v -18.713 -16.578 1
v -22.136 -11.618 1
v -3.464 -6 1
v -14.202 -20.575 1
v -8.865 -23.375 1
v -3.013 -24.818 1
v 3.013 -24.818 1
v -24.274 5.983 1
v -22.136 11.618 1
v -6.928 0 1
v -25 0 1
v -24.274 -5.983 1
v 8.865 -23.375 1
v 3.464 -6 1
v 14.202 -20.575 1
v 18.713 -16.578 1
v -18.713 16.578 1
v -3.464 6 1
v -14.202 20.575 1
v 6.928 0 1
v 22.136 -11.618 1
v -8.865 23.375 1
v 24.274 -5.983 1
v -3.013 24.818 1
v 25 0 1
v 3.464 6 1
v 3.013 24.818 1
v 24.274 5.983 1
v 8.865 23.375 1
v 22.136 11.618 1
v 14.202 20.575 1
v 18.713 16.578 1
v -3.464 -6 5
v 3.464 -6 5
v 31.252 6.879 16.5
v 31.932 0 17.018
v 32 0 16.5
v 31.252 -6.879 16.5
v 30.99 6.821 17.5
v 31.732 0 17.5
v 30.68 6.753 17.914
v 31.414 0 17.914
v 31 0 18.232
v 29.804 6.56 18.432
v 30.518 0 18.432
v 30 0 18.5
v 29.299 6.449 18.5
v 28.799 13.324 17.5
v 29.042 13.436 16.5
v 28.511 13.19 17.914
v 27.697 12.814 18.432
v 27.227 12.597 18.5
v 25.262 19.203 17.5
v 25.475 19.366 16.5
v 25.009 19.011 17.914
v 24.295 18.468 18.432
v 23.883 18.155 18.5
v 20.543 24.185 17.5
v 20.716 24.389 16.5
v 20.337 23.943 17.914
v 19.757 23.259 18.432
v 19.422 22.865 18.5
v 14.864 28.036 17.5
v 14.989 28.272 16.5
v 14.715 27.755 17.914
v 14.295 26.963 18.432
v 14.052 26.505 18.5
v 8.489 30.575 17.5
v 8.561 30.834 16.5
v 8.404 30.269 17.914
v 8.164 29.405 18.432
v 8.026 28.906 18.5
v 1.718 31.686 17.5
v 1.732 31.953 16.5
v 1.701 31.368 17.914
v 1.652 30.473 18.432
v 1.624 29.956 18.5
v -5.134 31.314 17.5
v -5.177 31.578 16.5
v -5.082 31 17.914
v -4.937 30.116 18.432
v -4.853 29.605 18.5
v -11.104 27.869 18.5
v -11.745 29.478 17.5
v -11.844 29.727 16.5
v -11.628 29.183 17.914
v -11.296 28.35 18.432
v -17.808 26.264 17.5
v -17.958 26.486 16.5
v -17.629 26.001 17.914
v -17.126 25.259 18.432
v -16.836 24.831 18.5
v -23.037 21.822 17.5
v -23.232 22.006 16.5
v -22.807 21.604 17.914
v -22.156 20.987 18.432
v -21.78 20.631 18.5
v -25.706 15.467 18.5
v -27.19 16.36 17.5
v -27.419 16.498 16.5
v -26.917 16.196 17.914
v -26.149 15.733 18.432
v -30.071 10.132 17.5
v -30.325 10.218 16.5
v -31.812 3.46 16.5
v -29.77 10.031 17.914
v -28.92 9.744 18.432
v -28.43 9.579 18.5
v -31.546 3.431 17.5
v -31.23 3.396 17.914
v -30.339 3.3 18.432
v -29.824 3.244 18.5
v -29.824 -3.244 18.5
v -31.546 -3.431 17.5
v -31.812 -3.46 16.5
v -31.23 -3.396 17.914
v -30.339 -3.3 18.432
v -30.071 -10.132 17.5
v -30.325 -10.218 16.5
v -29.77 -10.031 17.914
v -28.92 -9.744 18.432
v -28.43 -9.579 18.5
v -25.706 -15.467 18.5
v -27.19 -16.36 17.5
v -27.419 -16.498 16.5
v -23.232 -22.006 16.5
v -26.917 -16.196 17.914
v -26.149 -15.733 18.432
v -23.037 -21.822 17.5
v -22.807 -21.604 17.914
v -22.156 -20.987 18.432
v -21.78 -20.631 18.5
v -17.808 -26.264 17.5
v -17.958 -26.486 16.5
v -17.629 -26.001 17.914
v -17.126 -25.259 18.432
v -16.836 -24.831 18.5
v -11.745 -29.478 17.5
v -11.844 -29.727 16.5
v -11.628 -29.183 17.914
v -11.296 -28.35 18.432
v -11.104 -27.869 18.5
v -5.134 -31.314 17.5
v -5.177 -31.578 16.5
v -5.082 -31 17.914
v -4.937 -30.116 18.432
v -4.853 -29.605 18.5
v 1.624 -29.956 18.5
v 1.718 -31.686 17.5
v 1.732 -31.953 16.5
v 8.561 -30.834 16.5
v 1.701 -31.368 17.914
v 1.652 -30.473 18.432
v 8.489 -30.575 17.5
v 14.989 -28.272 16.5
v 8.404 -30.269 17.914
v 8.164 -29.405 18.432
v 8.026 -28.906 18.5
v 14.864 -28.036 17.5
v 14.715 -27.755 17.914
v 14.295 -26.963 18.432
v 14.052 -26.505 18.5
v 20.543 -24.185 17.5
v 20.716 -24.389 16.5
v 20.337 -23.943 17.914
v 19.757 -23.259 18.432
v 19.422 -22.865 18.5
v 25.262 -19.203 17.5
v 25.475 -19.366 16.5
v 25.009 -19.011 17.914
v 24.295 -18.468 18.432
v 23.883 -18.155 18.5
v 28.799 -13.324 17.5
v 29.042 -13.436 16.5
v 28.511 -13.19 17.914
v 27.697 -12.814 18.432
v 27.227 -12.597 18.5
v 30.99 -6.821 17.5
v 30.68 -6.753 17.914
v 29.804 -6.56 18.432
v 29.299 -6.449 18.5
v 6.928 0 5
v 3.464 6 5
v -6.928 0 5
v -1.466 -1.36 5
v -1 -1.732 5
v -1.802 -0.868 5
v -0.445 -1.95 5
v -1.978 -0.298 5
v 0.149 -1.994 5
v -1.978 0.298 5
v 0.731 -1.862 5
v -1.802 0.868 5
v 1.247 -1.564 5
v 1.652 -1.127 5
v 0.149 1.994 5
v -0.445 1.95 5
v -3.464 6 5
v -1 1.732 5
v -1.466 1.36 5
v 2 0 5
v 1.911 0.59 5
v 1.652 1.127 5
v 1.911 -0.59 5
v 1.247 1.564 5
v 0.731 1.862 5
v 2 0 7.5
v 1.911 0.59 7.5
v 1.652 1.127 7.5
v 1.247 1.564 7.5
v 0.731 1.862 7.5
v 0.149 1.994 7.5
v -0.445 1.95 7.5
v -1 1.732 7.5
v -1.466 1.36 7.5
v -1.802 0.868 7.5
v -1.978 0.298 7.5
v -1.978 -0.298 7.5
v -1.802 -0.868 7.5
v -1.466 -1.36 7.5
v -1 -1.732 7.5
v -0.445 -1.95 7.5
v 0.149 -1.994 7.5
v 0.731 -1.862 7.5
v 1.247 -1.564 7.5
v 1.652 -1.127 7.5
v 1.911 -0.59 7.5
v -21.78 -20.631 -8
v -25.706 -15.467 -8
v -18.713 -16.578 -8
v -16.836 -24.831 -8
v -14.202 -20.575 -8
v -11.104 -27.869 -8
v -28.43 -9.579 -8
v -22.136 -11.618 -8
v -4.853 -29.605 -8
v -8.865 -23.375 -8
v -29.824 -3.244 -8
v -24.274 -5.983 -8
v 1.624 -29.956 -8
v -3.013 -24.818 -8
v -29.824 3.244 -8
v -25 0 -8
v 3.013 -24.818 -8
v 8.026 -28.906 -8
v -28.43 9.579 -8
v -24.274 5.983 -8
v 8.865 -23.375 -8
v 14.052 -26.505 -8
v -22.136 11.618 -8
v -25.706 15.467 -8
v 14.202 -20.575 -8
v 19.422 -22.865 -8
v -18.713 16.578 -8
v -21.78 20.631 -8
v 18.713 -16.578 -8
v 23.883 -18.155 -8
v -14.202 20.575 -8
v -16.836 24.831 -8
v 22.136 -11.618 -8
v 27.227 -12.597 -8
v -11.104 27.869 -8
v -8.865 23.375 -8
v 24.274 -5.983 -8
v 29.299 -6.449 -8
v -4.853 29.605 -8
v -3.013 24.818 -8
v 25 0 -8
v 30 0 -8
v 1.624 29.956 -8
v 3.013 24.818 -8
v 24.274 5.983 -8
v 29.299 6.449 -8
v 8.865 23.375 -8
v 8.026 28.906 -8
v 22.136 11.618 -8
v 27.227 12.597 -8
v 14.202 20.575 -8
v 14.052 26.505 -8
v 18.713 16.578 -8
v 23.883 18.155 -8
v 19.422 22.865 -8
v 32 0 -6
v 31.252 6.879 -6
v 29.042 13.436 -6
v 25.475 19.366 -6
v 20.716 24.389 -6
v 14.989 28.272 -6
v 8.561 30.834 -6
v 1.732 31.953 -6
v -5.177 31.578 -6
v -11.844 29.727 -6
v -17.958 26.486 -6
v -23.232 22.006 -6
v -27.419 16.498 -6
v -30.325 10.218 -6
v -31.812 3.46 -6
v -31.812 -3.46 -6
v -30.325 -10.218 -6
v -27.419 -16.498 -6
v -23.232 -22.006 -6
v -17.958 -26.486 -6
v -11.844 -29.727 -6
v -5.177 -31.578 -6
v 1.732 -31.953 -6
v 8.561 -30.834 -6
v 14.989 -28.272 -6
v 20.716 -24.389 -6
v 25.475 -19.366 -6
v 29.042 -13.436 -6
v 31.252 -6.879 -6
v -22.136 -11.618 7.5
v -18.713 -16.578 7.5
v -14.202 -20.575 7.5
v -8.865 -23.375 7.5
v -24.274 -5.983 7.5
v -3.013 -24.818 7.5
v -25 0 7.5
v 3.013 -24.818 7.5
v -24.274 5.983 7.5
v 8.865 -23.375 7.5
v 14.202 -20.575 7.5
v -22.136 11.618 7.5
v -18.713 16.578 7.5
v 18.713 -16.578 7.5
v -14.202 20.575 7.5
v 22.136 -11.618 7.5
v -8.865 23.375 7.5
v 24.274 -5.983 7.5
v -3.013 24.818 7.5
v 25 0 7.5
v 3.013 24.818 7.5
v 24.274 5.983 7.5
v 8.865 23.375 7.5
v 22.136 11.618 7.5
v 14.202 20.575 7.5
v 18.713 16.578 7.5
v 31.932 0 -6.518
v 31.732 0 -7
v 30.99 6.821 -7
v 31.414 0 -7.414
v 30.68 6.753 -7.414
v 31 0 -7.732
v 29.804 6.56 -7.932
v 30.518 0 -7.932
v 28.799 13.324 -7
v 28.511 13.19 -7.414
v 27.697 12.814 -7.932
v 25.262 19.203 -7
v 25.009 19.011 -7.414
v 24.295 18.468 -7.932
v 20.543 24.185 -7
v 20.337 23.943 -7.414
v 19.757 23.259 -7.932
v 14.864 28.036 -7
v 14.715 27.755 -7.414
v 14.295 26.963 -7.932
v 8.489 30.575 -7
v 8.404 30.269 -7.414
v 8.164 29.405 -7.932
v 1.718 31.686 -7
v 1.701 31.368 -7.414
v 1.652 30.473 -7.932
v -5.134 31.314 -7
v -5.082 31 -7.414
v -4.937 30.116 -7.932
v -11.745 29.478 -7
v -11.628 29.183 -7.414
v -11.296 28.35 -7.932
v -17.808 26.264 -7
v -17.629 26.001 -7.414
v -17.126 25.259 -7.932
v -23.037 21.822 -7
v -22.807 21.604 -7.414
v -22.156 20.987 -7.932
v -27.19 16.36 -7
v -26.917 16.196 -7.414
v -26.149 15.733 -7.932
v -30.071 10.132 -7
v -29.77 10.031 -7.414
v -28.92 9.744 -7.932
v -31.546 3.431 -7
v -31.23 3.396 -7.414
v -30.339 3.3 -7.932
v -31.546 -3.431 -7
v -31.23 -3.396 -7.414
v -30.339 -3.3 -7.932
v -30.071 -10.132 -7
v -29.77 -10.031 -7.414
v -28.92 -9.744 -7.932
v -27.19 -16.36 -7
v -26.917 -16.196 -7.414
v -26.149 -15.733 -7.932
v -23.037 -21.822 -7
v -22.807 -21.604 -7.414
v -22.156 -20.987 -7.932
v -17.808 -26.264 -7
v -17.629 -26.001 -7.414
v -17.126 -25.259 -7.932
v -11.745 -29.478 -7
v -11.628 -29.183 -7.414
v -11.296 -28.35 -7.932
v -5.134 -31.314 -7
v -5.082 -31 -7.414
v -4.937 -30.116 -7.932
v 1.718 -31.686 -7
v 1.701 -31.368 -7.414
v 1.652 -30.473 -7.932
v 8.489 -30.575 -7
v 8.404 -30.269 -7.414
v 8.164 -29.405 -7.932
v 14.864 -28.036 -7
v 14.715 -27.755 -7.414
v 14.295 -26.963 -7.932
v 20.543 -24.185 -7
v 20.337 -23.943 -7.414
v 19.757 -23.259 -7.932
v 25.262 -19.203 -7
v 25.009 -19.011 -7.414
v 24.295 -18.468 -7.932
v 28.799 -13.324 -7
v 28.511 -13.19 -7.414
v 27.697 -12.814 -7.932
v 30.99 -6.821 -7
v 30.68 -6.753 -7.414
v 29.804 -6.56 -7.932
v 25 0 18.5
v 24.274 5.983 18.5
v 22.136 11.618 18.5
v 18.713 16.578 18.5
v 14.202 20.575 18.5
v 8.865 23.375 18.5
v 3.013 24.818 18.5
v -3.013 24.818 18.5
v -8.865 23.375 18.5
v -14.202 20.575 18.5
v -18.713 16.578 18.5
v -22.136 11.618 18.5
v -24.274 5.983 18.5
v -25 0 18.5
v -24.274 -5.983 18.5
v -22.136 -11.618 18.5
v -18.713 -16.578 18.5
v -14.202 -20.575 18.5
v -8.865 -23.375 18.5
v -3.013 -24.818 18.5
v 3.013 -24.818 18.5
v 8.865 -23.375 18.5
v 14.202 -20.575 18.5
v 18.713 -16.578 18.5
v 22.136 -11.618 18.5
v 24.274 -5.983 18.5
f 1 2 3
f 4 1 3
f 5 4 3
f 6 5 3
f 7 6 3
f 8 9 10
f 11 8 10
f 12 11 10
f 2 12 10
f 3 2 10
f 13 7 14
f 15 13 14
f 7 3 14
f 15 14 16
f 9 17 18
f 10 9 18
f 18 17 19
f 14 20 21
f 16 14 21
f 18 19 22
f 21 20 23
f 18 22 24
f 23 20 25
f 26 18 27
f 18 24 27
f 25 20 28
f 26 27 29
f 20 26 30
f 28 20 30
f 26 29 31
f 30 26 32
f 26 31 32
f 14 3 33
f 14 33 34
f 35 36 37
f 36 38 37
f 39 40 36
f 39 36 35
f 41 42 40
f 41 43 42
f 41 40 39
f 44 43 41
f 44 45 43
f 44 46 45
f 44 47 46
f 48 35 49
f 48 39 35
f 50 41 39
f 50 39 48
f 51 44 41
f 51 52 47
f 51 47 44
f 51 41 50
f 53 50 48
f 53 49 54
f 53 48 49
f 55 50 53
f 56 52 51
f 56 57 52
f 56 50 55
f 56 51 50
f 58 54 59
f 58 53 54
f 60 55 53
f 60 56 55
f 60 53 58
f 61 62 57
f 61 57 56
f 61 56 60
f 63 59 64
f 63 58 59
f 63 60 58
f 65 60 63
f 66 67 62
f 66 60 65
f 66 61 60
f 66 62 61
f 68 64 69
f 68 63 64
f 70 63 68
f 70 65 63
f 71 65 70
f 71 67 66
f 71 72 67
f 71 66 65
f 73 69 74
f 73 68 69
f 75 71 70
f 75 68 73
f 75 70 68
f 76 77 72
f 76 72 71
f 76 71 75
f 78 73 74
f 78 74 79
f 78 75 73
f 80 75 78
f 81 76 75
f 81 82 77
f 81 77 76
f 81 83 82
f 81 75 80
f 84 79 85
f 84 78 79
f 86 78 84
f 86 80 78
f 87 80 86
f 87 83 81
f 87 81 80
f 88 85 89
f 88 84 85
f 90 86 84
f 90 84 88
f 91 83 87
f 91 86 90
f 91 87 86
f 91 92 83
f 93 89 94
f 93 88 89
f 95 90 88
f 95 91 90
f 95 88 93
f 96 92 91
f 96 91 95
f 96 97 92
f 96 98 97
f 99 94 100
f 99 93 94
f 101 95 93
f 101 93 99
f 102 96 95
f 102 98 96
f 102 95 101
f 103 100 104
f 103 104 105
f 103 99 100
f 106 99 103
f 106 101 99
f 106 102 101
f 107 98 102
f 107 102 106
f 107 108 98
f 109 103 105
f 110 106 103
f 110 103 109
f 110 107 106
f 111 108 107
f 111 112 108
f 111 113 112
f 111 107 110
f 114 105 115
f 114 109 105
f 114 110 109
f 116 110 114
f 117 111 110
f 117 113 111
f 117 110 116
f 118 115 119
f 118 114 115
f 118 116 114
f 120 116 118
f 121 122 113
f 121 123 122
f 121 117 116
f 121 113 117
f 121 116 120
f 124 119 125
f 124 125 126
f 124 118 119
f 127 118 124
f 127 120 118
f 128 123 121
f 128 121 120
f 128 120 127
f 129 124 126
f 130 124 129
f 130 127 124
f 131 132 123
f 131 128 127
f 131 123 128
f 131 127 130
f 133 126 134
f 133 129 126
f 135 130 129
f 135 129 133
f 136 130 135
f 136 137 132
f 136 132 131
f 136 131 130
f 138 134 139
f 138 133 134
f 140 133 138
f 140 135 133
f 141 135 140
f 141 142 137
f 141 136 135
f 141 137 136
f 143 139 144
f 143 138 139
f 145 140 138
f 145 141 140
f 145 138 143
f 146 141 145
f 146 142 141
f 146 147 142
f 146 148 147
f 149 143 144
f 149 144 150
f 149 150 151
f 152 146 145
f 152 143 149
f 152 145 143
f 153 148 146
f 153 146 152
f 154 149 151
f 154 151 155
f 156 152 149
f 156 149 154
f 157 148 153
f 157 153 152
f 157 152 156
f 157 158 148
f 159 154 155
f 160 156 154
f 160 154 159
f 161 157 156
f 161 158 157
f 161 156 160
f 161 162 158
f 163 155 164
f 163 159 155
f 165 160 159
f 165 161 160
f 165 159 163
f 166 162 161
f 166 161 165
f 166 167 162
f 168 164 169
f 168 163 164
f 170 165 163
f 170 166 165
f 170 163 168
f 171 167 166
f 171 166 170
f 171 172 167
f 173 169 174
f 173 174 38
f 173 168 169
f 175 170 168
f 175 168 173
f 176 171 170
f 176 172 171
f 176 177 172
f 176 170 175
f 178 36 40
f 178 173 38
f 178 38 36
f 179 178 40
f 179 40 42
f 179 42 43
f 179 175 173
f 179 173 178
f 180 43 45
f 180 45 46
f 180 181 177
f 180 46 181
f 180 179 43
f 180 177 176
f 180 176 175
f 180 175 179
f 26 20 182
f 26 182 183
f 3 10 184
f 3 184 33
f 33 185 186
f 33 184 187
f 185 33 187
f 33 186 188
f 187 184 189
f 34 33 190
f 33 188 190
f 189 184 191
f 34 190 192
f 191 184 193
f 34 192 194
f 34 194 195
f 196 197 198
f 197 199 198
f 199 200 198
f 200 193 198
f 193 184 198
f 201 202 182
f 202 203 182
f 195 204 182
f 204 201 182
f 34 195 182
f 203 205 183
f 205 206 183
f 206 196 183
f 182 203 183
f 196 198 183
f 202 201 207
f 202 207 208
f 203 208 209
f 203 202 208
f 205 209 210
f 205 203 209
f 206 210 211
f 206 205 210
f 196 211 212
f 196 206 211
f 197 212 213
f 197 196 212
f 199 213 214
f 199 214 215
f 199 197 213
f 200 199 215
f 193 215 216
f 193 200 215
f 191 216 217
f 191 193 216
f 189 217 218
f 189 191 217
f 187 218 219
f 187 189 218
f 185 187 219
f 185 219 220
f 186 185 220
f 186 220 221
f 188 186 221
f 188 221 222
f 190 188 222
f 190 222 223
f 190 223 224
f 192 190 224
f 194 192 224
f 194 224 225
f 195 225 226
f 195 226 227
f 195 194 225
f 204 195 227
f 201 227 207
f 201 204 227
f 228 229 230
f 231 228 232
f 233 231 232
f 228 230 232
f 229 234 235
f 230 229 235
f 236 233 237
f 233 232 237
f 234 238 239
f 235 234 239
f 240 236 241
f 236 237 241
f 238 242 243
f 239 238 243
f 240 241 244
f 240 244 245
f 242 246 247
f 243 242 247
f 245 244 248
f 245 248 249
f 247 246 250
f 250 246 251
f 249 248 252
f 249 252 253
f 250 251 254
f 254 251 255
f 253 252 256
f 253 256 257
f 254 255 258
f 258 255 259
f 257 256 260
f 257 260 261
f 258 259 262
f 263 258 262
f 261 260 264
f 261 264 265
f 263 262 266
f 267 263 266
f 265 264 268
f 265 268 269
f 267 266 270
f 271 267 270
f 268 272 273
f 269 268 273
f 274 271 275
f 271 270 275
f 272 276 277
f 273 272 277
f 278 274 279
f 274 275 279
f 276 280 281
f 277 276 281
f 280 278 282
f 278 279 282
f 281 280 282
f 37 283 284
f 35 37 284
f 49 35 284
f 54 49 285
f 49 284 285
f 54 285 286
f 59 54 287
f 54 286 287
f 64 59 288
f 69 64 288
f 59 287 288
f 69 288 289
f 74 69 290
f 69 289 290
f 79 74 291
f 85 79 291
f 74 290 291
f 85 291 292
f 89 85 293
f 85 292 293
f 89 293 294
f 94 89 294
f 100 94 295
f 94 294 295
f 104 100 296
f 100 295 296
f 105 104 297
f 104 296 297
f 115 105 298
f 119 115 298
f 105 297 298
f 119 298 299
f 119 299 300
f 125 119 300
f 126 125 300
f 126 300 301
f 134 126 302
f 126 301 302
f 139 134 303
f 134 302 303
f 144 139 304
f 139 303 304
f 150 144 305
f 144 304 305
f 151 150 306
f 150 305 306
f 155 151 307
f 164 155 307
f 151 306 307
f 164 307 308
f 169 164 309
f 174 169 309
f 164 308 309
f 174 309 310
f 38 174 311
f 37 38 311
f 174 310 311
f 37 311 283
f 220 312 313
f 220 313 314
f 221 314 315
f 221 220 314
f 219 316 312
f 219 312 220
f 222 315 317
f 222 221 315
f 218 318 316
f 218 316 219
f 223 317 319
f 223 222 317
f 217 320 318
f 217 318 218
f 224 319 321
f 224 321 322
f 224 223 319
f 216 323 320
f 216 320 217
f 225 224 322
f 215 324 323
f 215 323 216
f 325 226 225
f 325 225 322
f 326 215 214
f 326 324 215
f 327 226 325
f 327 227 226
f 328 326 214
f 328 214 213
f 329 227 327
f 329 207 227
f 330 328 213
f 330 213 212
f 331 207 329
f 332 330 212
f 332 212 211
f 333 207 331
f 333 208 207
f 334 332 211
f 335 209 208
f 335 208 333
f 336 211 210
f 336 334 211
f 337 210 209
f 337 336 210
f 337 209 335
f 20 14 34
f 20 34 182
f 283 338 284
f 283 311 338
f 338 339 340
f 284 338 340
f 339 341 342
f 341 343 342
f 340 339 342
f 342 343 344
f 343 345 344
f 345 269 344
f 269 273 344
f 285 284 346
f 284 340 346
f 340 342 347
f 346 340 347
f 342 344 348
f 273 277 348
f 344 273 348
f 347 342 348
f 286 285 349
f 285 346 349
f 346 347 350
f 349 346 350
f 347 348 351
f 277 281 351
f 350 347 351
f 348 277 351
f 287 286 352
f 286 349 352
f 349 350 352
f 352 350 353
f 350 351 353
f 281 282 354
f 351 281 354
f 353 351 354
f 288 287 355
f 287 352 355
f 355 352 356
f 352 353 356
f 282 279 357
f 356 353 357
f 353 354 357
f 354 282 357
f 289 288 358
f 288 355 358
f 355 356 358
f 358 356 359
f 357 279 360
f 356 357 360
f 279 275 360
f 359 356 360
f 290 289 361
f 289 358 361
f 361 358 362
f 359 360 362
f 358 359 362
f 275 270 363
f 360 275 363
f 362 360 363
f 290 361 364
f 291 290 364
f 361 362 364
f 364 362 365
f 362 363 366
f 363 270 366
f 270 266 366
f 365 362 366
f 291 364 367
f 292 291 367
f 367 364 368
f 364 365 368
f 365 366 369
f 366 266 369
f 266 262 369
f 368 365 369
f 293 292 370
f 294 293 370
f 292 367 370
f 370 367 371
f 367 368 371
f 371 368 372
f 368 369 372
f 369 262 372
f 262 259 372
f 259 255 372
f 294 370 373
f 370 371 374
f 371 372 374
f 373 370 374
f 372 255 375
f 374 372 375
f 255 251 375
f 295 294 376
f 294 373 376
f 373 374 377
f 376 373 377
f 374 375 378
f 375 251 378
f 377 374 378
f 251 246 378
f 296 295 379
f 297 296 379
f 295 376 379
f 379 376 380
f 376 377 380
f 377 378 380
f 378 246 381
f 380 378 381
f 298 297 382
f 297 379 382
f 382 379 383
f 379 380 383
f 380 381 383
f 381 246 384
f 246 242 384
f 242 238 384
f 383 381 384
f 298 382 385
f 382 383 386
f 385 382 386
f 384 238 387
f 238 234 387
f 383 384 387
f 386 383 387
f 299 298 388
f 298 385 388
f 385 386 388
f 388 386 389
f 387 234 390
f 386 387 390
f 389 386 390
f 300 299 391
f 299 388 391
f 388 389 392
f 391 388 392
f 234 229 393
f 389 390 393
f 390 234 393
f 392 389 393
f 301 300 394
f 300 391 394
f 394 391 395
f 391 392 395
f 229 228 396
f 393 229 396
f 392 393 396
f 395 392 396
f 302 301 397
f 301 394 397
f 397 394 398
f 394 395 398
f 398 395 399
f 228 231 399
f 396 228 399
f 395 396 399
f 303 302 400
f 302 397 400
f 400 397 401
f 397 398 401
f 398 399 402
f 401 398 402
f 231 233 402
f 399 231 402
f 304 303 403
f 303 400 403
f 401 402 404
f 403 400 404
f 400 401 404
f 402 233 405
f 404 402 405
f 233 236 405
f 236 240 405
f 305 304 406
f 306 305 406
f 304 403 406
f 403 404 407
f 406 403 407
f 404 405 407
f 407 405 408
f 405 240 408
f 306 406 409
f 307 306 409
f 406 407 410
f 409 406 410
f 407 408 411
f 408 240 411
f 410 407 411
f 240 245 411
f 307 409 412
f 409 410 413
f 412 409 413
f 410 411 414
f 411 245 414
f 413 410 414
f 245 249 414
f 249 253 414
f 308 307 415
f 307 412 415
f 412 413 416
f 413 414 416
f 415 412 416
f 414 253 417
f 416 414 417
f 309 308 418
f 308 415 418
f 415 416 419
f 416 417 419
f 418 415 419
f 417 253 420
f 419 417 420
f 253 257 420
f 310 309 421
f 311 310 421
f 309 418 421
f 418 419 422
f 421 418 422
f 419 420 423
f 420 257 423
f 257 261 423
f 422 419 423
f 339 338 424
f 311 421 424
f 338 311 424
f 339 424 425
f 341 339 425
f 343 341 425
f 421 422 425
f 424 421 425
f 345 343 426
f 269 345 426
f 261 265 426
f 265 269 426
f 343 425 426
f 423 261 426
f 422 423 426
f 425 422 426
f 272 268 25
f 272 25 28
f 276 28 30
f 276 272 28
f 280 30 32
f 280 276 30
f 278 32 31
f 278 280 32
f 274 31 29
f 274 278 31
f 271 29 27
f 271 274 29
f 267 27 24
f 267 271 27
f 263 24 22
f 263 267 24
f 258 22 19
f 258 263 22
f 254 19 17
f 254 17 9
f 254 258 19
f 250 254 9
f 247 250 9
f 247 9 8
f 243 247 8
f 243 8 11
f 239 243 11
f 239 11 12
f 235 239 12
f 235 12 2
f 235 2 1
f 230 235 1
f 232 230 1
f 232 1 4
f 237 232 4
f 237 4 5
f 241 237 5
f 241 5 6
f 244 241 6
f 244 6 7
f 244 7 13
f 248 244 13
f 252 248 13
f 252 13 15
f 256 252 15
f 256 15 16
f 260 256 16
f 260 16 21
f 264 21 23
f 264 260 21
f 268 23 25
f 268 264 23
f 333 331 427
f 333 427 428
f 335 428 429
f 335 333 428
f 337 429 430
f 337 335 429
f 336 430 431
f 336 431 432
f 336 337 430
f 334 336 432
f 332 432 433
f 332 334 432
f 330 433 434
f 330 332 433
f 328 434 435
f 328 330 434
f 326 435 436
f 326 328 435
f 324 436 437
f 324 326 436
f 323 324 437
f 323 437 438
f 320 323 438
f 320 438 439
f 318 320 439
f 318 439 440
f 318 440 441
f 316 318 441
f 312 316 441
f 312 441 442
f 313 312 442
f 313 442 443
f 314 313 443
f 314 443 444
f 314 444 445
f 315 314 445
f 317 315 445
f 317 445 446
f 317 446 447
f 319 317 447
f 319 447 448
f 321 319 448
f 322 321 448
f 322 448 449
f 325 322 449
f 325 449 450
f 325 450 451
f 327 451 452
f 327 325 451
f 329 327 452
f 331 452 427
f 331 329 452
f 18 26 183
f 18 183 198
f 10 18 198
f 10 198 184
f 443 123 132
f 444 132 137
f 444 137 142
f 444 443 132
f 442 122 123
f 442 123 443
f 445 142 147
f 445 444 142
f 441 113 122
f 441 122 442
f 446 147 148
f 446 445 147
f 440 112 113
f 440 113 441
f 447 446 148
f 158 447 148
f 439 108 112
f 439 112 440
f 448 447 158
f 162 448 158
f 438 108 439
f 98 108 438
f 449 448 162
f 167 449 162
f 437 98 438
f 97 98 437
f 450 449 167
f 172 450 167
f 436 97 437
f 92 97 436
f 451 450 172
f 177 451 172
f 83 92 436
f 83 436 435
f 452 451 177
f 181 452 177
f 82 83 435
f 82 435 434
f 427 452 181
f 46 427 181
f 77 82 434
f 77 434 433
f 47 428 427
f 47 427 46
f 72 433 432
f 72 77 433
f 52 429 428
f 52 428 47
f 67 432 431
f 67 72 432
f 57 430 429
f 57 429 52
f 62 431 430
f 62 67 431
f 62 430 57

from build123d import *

# Parameters (mm, degrees)
EXTRUDE_START   = 1
SKETCH_1_R      = 25
EXTRUDE_1_DEPTH = 4
SKETCH_4_R      = 25
SKETCH_4_R_2    = 2
EXTRUDE_3_DEPTH = 2.5
EXTRUDE_START_2 = -15.5
SKETCH_6_R      = 32
SKETCH_6_R_2    = 25
EXTRUDE_4_DEPTH = 26.5
FILLET_1_R      = 2


with BuildPart() as part:
    # 草图1 → 凸台-拉伸1 (new body)
    with BuildSketch(Plane.XY.offset(EXTRUDE_START)):
        Circle(SKETCH_1_R)
        Polygon((3.464101615, 6), (-3.464101615, 6), (-6.92820323, 0), (-3.464101615, -6), (3.464101615, -6), (6.92820323, 0), align=None, mode=Mode.SUBTRACT)
    extrude(amount=EXTRUDE_1_DEPTH)

    # 草图4 → 凸台-拉伸3 (add)
    with BuildSketch(Plane.XY.offset(5)):
        Circle(SKETCH_4_R)
        Circle(SKETCH_4_R_2, mode=Mode.SUBTRACT)
    extrude(amount=EXTRUDE_3_DEPTH)

    # 草图6 → 凸台-拉伸4 (add)
    with BuildSketch(Plane.XY.offset(7.5).offset(EXTRUDE_START_2)):
        Circle(SKETCH_6_R)
        Circle(SKETCH_6_R_2, mode=Mode.SUBTRACT)
    extrude(amount=EXTRUDE_4_DEPTH)

    # 圆角1
    fillet_1_edges = [part.edges().sort_by_distance(p)[0] for p in [
        (-32, 0, -8),
        (-32, 0, 18.5),
    ]]
    fillet(fillet_1_edges, radius=FILLET_1_R)


solid = part.part
